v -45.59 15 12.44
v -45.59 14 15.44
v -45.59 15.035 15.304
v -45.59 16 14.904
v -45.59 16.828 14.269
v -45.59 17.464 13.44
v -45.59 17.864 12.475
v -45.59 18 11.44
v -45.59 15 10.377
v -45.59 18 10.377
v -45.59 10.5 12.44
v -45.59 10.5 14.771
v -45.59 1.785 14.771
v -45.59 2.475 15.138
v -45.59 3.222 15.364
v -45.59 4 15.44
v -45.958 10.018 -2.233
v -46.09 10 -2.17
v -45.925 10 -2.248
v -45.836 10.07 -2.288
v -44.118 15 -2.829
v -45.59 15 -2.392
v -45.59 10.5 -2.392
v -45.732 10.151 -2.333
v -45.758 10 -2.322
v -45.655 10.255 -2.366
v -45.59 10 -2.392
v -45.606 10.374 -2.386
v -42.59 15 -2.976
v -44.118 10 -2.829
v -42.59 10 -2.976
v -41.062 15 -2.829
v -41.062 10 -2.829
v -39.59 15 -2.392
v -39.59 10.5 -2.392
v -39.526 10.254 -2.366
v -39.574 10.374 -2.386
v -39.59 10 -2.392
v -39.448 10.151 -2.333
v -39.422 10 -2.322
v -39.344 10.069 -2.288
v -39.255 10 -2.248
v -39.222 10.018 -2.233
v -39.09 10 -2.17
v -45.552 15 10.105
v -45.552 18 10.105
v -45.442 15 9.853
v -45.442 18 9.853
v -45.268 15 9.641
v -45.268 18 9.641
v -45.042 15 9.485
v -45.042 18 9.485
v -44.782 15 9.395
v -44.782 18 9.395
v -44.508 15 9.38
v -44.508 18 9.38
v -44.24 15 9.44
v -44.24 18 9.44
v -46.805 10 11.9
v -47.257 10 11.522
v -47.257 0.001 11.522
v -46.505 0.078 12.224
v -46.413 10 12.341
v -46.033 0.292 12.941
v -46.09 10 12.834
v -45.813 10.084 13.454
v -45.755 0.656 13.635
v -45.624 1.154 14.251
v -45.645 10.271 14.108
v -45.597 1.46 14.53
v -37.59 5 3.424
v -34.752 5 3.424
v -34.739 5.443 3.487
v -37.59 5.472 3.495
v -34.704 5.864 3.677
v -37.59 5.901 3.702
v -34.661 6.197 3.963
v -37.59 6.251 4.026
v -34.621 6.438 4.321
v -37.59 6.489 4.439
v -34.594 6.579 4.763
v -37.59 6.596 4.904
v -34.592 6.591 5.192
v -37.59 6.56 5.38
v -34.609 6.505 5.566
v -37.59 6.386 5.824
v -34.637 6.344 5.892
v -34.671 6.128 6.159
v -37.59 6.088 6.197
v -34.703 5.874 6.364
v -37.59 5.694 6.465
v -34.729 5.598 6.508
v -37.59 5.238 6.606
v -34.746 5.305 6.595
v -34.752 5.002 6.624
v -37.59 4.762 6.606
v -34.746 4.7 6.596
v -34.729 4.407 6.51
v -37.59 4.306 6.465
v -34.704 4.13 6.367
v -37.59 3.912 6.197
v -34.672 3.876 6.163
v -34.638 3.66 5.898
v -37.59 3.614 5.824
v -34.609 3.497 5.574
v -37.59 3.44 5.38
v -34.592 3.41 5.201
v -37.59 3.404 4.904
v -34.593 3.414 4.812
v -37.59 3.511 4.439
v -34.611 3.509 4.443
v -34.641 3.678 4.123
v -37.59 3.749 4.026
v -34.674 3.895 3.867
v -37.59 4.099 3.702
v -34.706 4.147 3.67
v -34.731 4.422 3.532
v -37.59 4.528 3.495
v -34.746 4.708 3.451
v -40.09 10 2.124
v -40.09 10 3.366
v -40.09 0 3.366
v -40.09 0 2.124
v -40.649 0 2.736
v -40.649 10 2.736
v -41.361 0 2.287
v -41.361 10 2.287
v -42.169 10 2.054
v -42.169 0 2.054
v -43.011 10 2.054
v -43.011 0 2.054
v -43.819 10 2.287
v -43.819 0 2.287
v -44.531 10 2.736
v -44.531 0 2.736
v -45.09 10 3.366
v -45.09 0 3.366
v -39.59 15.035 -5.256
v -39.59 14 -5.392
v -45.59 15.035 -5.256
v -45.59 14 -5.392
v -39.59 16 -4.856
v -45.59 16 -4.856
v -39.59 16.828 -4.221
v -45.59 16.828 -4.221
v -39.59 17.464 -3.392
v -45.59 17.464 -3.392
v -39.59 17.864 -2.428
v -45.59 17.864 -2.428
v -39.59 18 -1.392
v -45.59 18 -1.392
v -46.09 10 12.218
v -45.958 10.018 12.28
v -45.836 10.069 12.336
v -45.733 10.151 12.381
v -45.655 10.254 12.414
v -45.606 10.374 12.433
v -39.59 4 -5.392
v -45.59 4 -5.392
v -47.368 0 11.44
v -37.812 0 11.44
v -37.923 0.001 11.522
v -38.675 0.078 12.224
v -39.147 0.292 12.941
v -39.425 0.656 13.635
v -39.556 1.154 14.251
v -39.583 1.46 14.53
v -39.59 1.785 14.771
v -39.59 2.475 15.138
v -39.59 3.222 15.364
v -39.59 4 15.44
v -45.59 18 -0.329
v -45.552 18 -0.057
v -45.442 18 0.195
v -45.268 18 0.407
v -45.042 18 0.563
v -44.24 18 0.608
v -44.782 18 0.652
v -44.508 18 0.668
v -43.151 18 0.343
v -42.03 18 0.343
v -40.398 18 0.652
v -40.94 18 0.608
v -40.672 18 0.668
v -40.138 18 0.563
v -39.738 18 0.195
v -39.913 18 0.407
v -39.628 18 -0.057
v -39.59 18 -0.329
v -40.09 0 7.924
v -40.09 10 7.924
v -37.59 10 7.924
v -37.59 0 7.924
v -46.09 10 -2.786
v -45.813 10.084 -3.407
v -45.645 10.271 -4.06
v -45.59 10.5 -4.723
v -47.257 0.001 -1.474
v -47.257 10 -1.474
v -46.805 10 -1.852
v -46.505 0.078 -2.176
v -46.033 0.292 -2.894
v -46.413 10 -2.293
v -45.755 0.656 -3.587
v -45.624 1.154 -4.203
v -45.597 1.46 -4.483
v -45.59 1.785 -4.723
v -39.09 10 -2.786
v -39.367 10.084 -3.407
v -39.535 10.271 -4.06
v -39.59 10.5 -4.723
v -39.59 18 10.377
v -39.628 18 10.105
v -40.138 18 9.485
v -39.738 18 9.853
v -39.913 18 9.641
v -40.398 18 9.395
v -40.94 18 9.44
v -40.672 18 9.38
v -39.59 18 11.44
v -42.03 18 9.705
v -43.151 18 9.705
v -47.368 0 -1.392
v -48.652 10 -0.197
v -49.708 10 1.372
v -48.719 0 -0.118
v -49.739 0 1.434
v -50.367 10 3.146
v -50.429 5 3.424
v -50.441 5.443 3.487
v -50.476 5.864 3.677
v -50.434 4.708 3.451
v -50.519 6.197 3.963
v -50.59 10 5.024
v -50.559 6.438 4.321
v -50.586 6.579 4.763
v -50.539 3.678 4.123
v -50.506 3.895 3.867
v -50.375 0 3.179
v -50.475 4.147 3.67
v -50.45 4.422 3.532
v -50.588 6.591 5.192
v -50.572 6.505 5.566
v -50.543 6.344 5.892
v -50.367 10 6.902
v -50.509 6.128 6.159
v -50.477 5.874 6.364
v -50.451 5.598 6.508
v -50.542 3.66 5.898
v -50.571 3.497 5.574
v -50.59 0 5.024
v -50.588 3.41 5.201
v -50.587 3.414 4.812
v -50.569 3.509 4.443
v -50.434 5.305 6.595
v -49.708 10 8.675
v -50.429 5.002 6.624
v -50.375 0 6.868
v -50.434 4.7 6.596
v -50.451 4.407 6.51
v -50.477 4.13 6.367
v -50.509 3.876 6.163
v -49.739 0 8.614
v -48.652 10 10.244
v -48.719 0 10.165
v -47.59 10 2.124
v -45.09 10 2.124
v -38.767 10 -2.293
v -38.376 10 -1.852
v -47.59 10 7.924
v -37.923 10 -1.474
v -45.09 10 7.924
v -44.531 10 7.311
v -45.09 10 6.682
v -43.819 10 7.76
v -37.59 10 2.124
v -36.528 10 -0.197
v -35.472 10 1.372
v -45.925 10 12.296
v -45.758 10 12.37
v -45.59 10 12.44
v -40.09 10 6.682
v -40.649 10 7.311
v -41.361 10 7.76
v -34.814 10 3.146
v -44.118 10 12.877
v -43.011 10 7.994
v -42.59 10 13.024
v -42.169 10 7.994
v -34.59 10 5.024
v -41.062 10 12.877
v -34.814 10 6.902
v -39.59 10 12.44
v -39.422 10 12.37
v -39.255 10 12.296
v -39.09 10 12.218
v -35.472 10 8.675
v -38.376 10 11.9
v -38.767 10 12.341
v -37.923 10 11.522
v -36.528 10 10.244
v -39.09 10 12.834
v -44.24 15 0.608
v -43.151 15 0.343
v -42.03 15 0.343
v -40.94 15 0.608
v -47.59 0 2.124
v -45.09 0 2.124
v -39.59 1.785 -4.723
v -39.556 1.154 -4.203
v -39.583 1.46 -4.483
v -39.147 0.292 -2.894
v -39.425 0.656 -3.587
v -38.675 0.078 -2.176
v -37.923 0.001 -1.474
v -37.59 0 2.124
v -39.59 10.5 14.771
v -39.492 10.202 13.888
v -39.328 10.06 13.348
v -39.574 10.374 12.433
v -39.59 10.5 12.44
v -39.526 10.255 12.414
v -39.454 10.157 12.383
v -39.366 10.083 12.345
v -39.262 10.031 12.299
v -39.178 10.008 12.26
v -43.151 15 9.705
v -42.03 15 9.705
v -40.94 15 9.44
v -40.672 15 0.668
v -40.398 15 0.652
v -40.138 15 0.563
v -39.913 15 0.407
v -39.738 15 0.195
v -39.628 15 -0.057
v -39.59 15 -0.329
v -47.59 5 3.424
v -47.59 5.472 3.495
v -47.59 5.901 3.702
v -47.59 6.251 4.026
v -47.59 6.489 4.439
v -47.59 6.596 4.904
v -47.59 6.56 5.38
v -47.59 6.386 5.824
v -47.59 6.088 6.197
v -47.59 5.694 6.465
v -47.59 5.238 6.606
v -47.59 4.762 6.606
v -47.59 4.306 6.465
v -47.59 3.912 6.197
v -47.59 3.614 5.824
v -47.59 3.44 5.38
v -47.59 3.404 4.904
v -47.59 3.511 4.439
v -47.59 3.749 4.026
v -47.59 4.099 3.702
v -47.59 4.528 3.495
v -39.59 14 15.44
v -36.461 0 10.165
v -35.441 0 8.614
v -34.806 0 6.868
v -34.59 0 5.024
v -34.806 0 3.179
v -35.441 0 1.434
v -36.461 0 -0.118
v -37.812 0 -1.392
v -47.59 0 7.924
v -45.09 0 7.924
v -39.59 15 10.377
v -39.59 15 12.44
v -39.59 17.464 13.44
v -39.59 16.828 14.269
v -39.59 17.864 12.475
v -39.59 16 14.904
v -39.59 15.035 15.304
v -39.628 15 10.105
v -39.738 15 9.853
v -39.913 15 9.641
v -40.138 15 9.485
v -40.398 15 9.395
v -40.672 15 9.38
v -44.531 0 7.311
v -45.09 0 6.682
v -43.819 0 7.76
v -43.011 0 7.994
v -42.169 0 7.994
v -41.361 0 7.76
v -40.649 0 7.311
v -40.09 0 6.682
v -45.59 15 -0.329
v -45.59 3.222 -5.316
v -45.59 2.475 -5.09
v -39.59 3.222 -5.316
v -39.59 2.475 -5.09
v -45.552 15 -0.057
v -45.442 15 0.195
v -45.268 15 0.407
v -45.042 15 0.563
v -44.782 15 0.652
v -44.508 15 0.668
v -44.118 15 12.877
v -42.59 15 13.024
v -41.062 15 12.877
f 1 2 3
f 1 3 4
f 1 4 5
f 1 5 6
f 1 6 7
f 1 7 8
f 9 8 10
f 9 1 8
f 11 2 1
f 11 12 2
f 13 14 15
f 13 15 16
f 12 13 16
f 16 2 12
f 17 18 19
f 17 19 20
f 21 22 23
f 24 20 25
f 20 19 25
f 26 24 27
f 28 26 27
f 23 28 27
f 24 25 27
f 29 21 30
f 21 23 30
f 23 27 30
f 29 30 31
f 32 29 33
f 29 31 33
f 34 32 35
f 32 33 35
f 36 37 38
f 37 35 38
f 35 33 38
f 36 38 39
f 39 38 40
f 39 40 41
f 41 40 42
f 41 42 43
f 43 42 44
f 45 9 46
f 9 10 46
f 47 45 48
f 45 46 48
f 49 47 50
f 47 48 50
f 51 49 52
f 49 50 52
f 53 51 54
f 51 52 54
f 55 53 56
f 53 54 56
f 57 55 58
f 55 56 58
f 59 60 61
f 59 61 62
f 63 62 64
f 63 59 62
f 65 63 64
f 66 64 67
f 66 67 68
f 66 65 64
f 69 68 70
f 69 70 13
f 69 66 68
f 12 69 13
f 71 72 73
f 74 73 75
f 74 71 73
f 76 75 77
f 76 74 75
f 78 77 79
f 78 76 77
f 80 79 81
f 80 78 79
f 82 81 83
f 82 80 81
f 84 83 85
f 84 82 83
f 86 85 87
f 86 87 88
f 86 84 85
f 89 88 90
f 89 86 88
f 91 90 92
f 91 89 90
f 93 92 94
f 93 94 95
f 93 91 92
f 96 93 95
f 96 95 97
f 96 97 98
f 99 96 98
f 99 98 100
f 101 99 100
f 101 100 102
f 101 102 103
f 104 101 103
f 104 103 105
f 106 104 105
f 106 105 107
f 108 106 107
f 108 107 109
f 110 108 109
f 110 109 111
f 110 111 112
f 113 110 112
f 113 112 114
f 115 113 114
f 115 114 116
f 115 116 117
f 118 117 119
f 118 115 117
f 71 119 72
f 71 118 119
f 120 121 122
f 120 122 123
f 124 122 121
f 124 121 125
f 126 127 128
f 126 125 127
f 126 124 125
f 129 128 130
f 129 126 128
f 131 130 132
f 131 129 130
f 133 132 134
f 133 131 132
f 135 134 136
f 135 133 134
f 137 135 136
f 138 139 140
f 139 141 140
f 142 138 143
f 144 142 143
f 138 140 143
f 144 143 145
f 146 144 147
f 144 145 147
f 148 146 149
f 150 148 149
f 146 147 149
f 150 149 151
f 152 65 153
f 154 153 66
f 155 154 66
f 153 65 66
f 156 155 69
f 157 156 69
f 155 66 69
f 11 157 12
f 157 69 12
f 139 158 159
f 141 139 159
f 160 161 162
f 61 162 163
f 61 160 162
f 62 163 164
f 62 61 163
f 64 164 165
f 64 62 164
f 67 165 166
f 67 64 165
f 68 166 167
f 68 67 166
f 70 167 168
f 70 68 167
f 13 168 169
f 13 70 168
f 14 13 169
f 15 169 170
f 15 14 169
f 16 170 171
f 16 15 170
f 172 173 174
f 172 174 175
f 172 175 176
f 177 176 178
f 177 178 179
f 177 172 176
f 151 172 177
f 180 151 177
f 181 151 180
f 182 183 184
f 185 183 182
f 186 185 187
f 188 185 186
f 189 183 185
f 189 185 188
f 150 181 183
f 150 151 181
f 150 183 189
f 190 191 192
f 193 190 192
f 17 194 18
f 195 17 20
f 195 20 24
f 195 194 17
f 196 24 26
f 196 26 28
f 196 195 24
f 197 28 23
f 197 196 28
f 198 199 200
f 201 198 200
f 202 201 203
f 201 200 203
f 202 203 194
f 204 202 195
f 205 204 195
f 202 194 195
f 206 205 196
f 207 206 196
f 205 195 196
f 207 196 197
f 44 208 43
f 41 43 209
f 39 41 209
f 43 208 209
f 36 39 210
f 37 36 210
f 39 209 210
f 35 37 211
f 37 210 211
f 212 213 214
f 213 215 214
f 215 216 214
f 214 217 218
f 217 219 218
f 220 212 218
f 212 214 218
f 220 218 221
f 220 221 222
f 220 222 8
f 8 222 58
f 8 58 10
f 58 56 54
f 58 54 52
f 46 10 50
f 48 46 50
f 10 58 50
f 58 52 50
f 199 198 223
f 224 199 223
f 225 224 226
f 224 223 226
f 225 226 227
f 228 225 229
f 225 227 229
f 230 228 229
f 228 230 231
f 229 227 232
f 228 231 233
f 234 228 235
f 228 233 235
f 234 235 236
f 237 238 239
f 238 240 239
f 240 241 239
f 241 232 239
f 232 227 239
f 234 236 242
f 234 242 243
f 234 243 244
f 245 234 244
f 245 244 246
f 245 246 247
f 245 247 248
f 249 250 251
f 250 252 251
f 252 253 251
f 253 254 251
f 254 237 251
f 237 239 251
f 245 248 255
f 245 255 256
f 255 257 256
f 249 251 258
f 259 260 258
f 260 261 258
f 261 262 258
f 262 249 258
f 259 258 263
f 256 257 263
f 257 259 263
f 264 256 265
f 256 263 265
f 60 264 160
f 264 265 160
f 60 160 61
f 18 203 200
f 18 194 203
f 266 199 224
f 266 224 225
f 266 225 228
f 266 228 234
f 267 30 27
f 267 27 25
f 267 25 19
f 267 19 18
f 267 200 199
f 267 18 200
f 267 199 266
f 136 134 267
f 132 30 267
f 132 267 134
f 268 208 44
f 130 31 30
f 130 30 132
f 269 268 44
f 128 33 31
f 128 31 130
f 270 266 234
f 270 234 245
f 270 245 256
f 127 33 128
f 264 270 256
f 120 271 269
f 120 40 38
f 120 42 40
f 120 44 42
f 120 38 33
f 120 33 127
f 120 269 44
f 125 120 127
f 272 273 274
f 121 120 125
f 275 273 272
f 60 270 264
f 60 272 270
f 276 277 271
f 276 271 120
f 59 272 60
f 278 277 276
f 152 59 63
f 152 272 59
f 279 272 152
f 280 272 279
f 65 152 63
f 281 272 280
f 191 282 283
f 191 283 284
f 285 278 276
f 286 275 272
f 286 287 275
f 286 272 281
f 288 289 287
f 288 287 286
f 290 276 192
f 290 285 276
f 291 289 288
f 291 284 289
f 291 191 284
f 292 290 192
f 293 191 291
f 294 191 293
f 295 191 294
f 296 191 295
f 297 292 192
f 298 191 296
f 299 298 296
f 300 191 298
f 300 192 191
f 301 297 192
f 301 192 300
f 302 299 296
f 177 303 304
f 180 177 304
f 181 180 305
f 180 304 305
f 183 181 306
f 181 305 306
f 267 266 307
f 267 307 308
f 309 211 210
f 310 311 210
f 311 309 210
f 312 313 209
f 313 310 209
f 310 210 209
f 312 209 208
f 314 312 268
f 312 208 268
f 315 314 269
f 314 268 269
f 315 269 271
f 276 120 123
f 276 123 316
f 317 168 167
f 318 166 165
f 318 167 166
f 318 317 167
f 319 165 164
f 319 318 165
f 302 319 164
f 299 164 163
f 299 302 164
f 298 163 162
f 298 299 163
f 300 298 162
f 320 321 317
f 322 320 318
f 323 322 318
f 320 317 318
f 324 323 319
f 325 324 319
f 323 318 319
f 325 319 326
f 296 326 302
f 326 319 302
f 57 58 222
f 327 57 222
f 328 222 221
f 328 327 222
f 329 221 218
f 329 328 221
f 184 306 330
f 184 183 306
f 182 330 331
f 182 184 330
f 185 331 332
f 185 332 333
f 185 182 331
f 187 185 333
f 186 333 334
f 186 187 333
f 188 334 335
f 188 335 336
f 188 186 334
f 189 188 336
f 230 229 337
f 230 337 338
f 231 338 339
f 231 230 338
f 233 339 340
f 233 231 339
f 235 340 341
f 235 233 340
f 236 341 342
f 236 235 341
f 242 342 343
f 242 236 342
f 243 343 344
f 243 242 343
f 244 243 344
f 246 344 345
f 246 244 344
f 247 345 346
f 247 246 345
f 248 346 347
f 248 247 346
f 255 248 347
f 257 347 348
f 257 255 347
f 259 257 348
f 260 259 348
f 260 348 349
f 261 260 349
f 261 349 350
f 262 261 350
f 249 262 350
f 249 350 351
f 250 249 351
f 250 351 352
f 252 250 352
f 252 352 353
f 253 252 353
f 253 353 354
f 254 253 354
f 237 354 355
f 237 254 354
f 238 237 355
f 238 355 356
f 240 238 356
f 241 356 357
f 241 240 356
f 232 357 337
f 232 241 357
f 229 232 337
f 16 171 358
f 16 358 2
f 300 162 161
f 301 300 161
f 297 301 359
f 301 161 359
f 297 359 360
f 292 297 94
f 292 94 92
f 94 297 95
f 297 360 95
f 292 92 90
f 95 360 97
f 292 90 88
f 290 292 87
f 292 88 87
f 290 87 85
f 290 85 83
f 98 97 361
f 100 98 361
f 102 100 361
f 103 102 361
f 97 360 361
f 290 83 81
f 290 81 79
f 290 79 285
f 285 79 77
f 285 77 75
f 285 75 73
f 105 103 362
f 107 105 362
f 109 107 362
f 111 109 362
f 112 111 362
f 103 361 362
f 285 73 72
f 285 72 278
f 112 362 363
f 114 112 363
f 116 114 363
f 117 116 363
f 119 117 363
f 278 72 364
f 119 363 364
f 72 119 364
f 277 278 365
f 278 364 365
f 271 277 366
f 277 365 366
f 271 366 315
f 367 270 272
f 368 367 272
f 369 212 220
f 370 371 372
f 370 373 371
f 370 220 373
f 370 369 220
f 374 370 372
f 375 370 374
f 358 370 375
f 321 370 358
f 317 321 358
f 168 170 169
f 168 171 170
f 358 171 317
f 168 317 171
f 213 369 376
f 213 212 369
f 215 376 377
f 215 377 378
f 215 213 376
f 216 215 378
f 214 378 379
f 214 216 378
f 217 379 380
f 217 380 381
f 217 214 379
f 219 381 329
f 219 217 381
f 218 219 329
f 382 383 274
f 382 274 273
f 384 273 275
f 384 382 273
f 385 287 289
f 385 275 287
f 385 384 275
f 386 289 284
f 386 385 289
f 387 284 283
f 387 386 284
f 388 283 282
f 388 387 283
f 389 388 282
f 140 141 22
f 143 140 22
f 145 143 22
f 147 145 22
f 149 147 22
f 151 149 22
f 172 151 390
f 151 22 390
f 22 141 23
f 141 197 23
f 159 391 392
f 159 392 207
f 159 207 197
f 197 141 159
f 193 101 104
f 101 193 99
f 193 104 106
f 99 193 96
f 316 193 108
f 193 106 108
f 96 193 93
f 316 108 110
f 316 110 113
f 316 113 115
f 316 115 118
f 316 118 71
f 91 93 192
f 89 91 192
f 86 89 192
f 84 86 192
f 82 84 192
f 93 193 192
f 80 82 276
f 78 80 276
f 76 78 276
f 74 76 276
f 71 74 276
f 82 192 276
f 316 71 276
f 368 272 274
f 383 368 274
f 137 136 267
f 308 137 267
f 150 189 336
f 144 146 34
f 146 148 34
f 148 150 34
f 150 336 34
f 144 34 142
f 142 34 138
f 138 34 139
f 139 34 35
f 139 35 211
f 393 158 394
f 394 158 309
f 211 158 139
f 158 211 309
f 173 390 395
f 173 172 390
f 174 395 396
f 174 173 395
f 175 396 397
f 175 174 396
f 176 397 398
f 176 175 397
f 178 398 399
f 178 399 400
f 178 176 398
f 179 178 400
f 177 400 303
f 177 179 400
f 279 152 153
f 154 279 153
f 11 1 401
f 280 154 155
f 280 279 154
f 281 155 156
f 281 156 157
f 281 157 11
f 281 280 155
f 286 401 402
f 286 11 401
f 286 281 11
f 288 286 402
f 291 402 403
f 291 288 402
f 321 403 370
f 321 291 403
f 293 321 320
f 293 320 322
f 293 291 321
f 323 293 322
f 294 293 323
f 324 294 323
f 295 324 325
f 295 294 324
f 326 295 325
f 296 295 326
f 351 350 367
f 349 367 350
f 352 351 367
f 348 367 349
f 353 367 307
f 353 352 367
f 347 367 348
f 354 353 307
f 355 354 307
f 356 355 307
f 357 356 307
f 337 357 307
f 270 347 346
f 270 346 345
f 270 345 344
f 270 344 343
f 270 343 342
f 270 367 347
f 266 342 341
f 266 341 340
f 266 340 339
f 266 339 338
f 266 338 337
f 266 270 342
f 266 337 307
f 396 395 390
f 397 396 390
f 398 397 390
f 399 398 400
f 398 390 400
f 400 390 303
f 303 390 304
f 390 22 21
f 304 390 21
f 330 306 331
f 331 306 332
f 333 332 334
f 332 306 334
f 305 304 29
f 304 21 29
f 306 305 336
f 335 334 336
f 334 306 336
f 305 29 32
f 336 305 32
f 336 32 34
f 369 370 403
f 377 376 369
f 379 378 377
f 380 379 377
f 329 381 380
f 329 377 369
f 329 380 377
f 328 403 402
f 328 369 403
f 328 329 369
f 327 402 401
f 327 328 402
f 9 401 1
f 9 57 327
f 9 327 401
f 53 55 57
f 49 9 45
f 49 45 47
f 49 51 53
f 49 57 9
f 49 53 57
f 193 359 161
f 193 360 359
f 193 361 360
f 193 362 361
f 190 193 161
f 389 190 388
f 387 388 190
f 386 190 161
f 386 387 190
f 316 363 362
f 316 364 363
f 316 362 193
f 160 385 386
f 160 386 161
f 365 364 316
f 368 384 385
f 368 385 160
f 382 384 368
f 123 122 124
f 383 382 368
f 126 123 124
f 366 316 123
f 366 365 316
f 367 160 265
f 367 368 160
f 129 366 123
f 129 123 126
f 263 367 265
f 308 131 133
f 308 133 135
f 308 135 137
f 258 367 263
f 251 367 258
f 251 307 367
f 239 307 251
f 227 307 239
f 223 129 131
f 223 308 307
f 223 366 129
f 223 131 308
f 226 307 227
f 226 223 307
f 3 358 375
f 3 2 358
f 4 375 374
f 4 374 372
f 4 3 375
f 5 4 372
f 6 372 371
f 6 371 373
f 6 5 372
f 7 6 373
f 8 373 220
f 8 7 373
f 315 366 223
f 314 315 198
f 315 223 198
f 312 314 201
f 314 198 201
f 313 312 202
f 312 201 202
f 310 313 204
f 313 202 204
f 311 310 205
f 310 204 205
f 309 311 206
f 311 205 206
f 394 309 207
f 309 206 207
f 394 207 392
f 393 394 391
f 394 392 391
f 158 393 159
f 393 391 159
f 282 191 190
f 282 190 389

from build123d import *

# Parameters (mm, degrees)
SKETCH1_R               = 8
SKETCH1_R_2             = 3
BOSS_EXTRUDE1_DEPTH     = 10
BOSS_EXTRUDE2_DEPTH     = 15
BOSS_EXTRUDE3_DEPTH     = 3
FILLET1_R               = 4
FILLET2_R               = 4
FILLET3_R               = 0.5
FILLET4_R               = 1
CUT_EXTRUDE1_DEPTH      = 56.872699751
CUT_EXTRUDE1_DEPTH_BACK = 56.872699751
SKETCH5_R               = 1.6
CUT_EXTRUDE2_REACH      = 55.831
SKETCH6_W               = 2.5
SKETCH6_H               = 5.8


with BuildPart() as part:
    # Sketch1 → Boss-Extrude1 (new body)
    with BuildSketch(Plane(origin=(0, 0, 0), x_dir=(1, 0, 0), z_dir=(0, 1, 0))):
        with Locations((-42.590141196, -5.023885001)):
            Circle(SKETCH1_R)
        with Locations((-42.590141196, -5.023885001)):
            Circle(SKETCH1_R_2, mode=Mode.SUBTRACT)
    extrude(amount=BOSS_EXTRUDE1_DEPTH)

    # Sketch2 → Boss-Extrude2 (add)
    with BuildSketch(Plane(origin=(0, 0, 0), x_dir=(1, 0, 0), z_dir=(0, 1, 0))):
        with BuildLine():
            Line((-39.590141196, -12.440083488), (-39.590141196, -15.440083488))
            Line((-39.590141196, -15.440083488), (-45.590141196, -15.440083488))
            Line((-45.590141196, -15.440083488), (-45.590141196, -12.440083488))
            ThreePointArc((-45.590141196, -12.440083488), (-42.590141196, -13.023885001), (-39.590141196, -12.440083488))
        make_face()
        with BuildLine():
            Line((-45.590141196, 5.392313486), (-45.590141196, 2.392313486))
            ThreePointArc((-45.590141196, 2.392313486), (-42.590141196, 2.976114999), (-39.590141196, 2.392313486))
            Line((-39.590141196, 2.392313486), (-39.590141196, 5.392313486))
            Line((-39.590141196, 5.392313486), (-45.590141196, 5.392313486))
        make_face()
    extrude(amount=BOSS_EXTRUDE2_DEPTH)

    # Sketch3 → Boss-Extrude3 (add)
    with BuildSketch(Plane(origin=(0, 15, 0), x_dir=(1, 0, 0), z_dir=(0, 1, 0))):
        with BuildLine():
            Line((-39.590141196, -15.440083488), (-45.590141196, -15.440083488))
            Line((-45.590141196, -15.440083488), (-45.590141196, -8.660434161))
            ThreePointArc((-45.590141196, -8.660434161), (-42.590141196, -9.738170715), (-39.590141196, -8.660434161))
            Line((-39.590141196, -8.660434161), (-39.590141196, -15.440083488))
        make_face()
        with BuildLine():
            Line((-45.590141196, 5.392313486), (-45.590141196, -1.38733584))
            ThreePointArc((-45.590141196, -1.38733584), (-42.590141196, -0.309599286), (-39.590141196, -1.38733584))
            Line((-39.590141196, -1.38733584), (-39.590141196, 5.392313486))
            Line((-39.590141196, 5.392313486), (-45.590141196, 5.392313486))
        make_face()
    extrude(amount=BOSS_EXTRUDE3_DEPTH)

    # Fillet1
    fillet1_edges = [part.edges().sort_by_distance(p)[0] for p in [
        (-39.590141196, 5, -2.392313486),
        (-39.590141196, 5, 12.440083488),
        (-45.590141196, 5, 12.440083488),
        (-45.590141196, 5, -2.392313486),
    ]]
    fillet(fillet1_edges, radius=FILLET1_R)

    # Fillet2
    fillet2_edges = [part.edges().sort_by_distance(p)[0] for p in [
        (-42.590141196, 18, 15.440083488),
        (-42.590141196, 18, -5.392313486),
        (-42.590141196, 0, -5.392313486),
        (-42.590141196, 0, 15.440083488),
    ]]
    fillet(fillet2_edges, radius=FILLET2_R)

    # Fillet3
    fillet3_edges = [part.edges().sort_by_distance(p)[0] for p in [
        (-39.590141196, 10, 13.605381417),
        (-45.590141196, 10, 13.605381417),
        (-45.590141196, 10, -3.557611415),
        (-39.590141196, 10, -3.557611415),
    ]]
    fillet(fillet3_edges, radius=FILLET3_R)

    # Fillet4
    fillet4_edges = [part.edges().sort_by_distance(p)[0] for p in [
        (-39.590141196, 16.5, 8.660434161),
        (-45.590141196, 16.5, 8.660434161),
        (-39.590141196, 16.5, 1.38733584),
        (-45.590141196, 16.5, 1.38733584),
    ]]
    fillet(fillet4_edges, radius=FILLET4_R)

    # Sketch5 → Cut-Extrude1 (cut, two sides: drawn at the far end of the back side and taken through both)
    with BuildSketch(Plane(origin=(0, 0, 0), x_dir=(0, 0, -1), z_dir=(1, 0, 0)).offset(-CUT_EXTRUDE1_DEPTH_BACK)):
        with Locations((-5.023885001, 5)):
            Circle(SKETCH5_R)
    extrude(amount=CUT_EXTRUDE1_DEPTH + CUT_EXTRUDE1_DEPTH_BACK, mode=Mode.SUBTRACT)

    # Sketch6 → Cut-Extrude2 (cut, up to next)
    with BuildSketch(Plane(origin=(0, 10, 0), x_dir=(1, 0, 0), z_dir=(0, 1, 0)), mode=Mode.PRIVATE) as cut_extrude2_sk1:
        with Locations((-38.840141196, -5.023885001)):
            Rectangle(SKETCH6_W, SKETCH6_H)
    cut_extrude2_tool1 = extrude(cut_extrude2_sk1.sketch, amount=-CUT_EXTRUDE2_REACH, mode=Mode.PRIVATE) & part.part
    # Sketch6 → Cut-Extrude2 (cut, up to next)
    with BuildSketch(Plane(origin=(0, 10, 0), x_dir=(1, 0, 0), z_dir=(0, 1, 0)), mode=Mode.PRIVATE) as cut_extrude2_sk2:
        with Locations((-46.340141196, -5.023885001)):
            Rectangle(SKETCH6_W, SKETCH6_H)
    cut_extrude2_tool2 = extrude(cut_extrude2_sk2.sketch, amount=-CUT_EXTRUDE2_REACH, mode=Mode.PRIVATE) & part.part
    add(cut_extrude2_tool1.solids().sort_by_distance((-38.840141, 10, 5.023885))[0], mode=Mode.SUBTRACT)
    add(cut_extrude2_tool2.solids().sort_by_distance((-46.340141, 10, 5.023885))[0], mode=Mode.SUBTRACT)


solid = part.part
